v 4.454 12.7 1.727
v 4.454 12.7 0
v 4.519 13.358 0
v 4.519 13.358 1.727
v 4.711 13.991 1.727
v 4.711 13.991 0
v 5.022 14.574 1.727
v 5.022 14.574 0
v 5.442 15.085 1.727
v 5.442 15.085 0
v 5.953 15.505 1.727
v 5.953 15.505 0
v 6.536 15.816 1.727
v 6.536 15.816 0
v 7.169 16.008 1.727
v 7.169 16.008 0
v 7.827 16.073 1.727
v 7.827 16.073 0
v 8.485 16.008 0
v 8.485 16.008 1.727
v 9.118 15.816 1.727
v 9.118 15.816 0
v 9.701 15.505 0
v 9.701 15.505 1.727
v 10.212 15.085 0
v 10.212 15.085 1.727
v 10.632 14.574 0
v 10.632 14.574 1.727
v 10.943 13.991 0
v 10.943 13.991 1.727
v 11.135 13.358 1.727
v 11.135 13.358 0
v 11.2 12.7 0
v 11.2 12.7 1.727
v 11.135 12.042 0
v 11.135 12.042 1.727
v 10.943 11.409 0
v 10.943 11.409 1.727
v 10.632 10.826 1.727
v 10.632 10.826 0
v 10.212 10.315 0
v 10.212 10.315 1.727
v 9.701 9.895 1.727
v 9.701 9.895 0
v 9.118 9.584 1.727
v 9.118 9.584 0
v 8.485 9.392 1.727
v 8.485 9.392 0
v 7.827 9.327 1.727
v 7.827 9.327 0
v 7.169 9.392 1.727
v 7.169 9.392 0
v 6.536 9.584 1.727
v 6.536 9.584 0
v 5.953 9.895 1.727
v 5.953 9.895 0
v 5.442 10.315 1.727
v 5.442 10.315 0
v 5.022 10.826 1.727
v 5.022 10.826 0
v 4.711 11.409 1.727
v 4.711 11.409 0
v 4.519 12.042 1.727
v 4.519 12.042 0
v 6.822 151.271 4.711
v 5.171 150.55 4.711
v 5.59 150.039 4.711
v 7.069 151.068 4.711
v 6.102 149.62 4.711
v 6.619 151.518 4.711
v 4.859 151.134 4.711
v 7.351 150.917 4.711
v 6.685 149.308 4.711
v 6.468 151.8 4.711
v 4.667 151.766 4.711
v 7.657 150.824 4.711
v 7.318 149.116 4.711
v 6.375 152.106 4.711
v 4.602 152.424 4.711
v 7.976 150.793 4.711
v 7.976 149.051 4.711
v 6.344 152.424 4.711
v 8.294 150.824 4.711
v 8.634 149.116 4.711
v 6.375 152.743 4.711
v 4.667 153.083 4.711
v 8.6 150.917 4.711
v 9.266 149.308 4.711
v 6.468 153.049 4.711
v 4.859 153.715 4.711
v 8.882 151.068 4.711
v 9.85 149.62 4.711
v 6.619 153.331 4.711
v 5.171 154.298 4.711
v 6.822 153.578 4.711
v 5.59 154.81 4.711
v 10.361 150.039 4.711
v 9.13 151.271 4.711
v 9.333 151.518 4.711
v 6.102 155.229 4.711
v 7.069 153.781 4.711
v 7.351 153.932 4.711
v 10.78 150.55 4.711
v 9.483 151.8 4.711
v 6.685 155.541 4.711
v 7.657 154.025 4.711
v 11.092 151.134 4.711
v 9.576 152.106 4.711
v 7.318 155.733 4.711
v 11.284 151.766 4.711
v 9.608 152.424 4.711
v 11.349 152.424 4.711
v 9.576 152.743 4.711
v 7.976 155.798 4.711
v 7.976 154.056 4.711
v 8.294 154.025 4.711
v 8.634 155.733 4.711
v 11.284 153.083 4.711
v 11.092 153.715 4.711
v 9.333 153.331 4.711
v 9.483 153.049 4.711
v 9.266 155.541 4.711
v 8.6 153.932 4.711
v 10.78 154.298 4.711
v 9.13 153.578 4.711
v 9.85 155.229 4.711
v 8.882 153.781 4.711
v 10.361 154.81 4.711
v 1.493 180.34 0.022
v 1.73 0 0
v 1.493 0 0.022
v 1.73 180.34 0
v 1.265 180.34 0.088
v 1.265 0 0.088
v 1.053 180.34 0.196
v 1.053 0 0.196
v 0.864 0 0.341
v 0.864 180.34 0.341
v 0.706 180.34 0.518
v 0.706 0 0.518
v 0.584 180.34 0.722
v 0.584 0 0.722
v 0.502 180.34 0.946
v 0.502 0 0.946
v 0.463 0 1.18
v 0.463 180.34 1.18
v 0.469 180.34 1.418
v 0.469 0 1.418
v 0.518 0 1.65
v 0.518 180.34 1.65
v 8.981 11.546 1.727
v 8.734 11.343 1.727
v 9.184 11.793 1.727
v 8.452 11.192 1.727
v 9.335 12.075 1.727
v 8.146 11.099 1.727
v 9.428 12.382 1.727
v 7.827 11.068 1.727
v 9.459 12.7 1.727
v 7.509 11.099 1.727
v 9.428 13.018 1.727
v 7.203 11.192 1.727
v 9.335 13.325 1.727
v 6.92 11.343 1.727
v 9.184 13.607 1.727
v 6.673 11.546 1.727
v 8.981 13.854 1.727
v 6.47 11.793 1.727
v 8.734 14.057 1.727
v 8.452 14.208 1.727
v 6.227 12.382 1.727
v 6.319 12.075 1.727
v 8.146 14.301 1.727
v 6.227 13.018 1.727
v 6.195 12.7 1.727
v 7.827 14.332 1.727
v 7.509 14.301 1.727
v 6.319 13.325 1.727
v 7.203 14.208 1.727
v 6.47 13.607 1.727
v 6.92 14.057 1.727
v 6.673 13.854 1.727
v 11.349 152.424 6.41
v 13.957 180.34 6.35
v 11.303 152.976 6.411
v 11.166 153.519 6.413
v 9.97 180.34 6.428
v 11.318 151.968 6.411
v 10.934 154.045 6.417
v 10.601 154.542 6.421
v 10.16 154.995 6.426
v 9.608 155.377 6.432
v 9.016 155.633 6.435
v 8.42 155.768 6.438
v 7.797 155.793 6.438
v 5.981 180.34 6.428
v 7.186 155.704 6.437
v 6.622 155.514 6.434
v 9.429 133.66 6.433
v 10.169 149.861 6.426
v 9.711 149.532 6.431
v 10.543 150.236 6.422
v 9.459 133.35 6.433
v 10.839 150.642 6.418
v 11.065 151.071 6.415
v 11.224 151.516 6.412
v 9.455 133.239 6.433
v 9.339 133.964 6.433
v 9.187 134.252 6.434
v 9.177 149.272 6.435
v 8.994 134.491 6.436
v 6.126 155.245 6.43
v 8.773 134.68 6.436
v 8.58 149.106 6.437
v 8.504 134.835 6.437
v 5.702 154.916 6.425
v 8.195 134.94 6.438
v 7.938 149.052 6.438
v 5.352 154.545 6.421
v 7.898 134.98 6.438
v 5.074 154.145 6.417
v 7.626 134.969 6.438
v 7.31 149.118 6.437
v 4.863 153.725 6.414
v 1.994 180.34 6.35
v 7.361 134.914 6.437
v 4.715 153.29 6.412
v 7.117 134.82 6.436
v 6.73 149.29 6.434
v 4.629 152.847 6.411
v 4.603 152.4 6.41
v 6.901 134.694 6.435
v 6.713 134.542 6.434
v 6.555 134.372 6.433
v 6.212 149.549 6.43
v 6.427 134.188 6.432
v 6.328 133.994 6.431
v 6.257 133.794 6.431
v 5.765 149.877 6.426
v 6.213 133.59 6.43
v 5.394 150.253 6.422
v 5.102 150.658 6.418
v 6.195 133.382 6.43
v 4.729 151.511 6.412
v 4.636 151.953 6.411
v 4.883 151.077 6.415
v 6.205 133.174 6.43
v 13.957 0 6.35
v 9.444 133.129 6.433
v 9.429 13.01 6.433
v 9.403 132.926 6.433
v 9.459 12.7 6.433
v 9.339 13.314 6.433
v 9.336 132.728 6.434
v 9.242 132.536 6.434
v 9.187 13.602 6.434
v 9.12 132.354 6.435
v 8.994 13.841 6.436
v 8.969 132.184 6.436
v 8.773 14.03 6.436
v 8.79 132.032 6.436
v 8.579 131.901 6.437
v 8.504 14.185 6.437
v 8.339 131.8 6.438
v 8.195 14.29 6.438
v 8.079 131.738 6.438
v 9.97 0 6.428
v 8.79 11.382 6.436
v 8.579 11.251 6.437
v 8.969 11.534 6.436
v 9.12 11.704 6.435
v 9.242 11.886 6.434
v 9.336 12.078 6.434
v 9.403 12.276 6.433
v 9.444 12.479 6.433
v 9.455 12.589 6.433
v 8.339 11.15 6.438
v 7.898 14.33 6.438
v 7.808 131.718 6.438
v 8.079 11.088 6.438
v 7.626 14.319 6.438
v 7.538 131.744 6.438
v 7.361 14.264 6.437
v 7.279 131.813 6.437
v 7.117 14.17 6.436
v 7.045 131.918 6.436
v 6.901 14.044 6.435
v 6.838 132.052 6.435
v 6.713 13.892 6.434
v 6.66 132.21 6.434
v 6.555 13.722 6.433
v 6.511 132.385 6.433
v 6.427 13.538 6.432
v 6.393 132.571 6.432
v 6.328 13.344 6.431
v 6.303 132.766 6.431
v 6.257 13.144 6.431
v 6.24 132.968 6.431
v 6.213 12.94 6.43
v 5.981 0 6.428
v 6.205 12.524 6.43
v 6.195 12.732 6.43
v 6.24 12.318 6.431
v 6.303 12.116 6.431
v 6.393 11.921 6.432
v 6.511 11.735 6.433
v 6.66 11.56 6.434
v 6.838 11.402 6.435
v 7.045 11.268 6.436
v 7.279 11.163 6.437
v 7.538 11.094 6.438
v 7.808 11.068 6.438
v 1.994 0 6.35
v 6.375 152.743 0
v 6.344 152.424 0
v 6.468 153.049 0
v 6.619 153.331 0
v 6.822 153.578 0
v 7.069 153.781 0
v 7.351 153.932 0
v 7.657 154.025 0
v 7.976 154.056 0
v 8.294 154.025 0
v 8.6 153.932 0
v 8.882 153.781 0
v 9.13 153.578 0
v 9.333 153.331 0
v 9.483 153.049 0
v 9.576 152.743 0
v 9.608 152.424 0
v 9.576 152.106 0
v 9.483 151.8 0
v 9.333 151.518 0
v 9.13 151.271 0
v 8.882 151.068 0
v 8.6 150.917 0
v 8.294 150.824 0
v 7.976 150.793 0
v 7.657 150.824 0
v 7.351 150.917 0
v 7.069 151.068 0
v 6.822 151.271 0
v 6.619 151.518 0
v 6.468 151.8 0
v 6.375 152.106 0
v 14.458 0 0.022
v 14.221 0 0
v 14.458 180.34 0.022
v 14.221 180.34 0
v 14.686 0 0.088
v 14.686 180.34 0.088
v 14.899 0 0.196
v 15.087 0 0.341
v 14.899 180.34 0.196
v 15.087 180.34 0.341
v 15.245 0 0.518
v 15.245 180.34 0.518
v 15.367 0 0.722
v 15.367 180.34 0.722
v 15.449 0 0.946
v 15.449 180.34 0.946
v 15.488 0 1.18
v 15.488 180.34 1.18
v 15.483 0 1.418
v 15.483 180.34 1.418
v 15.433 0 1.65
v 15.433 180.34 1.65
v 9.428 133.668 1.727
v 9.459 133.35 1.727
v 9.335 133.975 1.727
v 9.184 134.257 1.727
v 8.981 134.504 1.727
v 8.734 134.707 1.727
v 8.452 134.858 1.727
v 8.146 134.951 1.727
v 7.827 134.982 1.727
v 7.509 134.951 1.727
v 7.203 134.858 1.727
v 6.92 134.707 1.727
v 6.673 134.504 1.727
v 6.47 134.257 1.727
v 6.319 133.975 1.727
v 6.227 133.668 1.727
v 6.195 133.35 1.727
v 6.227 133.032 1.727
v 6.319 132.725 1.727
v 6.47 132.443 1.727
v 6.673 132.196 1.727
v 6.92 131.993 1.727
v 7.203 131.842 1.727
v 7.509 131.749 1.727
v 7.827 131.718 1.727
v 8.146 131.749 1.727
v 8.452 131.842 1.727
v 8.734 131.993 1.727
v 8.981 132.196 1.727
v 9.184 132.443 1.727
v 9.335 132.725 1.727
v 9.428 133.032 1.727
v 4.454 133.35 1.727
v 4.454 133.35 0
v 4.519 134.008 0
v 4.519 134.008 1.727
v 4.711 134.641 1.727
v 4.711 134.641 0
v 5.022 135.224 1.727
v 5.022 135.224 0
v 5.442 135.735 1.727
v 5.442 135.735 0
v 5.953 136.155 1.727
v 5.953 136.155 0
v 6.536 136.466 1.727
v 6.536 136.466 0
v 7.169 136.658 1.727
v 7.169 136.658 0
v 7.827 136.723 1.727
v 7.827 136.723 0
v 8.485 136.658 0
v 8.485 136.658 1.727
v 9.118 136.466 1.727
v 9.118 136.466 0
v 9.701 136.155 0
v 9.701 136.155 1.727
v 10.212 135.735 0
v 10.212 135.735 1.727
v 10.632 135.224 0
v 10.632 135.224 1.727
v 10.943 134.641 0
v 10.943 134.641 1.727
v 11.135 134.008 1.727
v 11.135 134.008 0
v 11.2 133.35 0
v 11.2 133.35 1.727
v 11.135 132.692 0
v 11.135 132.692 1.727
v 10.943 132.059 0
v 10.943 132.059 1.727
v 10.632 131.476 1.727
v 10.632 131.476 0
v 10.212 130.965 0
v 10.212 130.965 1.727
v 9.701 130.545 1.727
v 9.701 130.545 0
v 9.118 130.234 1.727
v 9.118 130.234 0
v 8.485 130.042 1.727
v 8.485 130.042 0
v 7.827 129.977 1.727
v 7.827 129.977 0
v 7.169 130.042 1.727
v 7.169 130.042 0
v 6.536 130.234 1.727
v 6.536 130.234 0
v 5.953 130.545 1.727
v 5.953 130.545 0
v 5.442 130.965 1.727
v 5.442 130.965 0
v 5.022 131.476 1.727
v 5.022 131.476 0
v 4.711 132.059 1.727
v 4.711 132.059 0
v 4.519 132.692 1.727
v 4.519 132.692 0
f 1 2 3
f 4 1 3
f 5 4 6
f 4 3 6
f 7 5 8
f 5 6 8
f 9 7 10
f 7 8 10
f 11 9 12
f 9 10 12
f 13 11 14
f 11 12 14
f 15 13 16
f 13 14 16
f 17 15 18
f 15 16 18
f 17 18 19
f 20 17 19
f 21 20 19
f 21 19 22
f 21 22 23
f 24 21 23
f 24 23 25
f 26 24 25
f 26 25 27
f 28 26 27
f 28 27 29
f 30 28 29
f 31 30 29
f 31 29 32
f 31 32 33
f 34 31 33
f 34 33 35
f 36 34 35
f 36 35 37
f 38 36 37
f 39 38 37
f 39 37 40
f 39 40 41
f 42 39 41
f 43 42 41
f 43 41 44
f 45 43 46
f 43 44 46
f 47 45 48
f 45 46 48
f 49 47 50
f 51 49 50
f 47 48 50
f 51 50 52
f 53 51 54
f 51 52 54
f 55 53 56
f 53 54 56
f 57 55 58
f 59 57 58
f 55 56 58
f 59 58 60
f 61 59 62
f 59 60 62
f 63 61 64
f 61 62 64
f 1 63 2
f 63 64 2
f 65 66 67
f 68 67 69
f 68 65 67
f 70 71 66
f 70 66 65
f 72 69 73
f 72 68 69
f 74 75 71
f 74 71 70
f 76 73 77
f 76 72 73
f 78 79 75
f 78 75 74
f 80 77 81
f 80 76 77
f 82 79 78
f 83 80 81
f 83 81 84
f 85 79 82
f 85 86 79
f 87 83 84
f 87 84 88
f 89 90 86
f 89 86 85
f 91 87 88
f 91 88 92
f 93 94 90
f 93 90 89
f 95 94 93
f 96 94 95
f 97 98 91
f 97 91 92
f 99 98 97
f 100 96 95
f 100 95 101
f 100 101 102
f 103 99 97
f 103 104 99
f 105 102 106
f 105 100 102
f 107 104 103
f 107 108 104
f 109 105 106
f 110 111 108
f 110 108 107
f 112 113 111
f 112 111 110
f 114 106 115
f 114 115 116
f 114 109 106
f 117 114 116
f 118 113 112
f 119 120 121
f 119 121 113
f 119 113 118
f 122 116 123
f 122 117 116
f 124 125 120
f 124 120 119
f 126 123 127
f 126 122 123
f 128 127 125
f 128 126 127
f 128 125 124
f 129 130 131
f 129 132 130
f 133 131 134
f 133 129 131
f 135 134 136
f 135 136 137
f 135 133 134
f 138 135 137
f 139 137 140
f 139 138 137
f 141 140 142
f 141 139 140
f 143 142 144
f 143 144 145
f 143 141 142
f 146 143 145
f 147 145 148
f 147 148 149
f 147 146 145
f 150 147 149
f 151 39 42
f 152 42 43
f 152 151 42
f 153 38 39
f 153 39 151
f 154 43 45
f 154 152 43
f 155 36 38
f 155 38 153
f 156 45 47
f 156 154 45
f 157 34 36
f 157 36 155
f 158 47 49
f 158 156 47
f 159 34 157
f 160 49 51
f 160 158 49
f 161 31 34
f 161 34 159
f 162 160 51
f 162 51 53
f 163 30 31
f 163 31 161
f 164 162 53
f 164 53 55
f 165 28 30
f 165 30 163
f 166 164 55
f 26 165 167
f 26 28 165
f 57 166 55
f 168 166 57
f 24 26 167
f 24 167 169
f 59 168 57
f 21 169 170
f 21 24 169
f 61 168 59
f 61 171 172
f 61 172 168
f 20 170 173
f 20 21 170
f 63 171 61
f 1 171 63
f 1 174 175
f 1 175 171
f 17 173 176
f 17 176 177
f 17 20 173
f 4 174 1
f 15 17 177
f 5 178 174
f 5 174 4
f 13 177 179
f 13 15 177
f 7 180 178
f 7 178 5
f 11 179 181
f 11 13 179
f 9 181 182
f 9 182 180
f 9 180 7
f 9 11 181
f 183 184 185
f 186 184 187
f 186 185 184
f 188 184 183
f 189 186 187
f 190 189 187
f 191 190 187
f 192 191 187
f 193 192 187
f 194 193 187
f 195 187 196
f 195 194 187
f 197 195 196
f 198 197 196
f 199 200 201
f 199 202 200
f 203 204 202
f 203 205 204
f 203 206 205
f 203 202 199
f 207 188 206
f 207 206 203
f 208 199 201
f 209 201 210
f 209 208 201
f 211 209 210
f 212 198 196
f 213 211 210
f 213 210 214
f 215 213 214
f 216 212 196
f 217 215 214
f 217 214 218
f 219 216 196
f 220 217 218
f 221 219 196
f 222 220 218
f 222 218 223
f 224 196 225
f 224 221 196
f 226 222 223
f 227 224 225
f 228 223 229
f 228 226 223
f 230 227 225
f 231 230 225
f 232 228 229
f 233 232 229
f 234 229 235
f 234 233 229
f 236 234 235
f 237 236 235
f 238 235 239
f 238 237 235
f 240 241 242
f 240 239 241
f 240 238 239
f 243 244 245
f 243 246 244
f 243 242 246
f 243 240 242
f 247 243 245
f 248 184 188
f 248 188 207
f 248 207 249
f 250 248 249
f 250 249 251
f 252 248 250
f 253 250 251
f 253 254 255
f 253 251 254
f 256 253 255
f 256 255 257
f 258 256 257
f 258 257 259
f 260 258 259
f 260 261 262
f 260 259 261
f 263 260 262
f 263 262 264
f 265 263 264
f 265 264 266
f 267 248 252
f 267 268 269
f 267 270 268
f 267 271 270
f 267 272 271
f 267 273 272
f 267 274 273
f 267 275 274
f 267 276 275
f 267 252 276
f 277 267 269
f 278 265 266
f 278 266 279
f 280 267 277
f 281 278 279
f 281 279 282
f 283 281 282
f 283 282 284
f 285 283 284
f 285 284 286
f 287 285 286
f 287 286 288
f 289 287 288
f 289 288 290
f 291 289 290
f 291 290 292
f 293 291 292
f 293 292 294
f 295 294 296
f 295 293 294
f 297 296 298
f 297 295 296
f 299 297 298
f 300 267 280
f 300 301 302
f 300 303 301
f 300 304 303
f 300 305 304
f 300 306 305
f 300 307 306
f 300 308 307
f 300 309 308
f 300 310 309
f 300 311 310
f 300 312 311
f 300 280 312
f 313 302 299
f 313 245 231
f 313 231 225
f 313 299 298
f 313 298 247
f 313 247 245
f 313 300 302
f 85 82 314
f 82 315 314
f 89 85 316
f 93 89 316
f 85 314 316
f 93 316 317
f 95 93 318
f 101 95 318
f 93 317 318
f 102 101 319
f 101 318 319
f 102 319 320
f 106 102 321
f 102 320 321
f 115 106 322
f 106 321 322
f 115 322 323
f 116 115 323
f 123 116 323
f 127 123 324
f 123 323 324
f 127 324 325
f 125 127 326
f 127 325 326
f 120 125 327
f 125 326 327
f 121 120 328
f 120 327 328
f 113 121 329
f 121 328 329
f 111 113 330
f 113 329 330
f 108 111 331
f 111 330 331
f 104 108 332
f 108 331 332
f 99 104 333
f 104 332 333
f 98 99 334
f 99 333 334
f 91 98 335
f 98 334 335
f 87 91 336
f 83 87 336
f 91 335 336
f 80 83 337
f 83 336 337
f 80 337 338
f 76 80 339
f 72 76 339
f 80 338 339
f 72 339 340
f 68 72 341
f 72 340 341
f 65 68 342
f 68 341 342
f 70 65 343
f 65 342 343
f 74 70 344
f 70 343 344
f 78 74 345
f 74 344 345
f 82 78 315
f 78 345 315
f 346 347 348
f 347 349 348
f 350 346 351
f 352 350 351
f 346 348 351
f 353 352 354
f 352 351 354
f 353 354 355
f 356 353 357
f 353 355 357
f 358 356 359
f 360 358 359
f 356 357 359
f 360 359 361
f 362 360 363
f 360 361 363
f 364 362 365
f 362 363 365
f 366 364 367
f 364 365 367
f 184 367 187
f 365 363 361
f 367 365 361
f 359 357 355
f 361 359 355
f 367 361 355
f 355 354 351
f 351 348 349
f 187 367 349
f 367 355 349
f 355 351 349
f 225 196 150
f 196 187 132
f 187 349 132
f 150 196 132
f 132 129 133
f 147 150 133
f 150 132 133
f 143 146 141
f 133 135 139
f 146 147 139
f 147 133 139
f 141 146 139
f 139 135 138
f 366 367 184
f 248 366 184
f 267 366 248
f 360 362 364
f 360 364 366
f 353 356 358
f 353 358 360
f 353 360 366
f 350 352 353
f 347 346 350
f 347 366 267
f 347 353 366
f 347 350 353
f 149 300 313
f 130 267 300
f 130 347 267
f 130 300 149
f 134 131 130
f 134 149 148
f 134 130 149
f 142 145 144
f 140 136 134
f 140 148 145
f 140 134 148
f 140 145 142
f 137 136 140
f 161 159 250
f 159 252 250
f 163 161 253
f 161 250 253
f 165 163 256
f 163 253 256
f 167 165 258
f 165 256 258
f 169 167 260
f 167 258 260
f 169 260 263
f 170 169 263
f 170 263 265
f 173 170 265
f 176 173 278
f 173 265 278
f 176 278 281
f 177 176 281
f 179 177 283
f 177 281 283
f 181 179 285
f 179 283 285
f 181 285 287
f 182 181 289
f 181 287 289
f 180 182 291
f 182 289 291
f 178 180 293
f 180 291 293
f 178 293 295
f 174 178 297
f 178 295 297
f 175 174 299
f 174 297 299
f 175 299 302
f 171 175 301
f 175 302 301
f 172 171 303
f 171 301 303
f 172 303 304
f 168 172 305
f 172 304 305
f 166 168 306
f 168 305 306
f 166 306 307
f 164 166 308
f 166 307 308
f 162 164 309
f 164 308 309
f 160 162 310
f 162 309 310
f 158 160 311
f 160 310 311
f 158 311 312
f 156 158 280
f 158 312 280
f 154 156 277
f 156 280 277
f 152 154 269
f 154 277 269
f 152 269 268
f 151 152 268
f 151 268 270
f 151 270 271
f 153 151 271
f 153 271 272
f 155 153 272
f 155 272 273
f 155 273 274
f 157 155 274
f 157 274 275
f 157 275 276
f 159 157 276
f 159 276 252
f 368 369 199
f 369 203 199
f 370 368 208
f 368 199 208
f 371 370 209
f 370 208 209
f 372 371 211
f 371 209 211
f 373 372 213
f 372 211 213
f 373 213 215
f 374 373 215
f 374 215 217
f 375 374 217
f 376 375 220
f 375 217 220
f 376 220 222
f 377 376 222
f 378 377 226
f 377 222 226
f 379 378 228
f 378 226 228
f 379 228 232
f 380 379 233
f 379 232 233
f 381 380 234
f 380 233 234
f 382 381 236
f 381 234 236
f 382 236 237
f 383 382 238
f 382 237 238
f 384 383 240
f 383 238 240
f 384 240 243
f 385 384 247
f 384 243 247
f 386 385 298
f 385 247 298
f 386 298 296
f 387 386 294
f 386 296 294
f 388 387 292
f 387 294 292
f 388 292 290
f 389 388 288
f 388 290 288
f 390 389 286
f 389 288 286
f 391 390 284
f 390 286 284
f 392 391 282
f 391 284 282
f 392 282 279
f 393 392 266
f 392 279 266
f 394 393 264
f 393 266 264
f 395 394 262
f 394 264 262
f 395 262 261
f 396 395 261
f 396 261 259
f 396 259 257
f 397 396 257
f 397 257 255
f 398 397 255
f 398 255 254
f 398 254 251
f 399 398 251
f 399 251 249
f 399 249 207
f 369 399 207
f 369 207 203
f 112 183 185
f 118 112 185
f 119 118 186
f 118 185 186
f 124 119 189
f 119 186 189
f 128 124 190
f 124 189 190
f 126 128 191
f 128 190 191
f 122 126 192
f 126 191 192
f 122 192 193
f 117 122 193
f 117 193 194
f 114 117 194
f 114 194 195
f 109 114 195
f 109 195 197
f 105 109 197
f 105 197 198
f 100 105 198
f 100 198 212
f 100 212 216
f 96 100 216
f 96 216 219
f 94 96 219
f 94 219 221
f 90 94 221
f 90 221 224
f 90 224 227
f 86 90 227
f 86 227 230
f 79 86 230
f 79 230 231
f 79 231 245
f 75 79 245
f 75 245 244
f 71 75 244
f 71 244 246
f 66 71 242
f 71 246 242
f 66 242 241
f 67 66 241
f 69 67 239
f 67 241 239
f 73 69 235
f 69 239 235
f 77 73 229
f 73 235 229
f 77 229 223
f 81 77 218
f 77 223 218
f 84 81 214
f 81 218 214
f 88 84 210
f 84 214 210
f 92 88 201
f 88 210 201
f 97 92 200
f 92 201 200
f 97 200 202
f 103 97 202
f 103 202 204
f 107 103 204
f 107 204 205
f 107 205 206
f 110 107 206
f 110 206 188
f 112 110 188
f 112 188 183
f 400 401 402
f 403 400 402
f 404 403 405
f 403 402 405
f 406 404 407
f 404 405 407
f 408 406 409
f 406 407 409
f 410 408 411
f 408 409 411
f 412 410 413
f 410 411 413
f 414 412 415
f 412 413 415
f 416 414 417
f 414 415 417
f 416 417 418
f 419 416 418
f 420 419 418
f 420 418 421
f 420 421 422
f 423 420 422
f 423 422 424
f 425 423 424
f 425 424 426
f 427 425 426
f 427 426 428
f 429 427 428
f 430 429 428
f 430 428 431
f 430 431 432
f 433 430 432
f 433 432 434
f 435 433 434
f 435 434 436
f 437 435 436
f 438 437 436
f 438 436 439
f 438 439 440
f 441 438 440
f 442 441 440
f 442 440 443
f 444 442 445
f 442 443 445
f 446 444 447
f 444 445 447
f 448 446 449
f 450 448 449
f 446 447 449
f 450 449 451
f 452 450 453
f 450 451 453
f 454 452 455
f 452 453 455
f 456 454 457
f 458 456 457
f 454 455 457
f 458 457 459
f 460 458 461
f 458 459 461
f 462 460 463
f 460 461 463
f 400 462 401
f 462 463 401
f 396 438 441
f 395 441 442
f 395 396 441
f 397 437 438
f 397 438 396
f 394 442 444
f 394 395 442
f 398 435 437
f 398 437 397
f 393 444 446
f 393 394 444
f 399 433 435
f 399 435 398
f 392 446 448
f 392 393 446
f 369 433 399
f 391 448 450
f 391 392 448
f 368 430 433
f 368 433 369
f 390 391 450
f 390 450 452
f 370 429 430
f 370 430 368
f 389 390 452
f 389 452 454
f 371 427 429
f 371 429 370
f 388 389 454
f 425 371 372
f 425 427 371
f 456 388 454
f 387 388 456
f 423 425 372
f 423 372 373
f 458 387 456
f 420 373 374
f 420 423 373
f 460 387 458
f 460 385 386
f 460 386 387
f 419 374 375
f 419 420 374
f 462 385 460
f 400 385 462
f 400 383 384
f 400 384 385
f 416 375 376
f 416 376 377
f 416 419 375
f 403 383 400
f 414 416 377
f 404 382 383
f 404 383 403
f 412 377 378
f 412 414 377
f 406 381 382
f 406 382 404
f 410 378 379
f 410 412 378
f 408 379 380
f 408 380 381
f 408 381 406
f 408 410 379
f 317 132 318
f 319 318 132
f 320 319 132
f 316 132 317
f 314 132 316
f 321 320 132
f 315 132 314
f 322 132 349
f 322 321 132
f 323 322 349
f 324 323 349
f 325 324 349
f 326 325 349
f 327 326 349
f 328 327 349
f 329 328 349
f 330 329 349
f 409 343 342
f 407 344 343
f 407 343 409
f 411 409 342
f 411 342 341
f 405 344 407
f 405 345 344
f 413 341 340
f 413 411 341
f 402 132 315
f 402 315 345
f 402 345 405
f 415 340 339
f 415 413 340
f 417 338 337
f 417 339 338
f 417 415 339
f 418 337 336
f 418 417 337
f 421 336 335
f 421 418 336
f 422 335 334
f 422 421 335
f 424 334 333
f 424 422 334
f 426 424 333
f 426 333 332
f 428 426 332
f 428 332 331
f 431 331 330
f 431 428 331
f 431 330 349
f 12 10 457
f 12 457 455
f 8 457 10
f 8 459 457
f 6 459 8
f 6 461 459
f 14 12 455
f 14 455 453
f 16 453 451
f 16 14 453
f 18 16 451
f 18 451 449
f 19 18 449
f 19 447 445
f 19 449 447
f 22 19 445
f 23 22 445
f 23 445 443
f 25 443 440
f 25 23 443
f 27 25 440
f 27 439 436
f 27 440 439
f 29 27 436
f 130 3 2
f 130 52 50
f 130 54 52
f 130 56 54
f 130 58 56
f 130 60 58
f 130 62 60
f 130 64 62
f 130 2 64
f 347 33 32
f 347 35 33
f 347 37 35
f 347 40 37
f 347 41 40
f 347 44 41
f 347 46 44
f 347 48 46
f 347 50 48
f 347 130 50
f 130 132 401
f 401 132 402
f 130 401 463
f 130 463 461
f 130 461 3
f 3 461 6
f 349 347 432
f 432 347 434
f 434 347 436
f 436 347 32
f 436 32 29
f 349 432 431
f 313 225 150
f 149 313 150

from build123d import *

# Parameters (mm, degrees)
BOSS_EXTRUDE4_DEPTH                                 = 180.34
CBORE_FOR_4_BINDING_HEAD_MACHINE_SCREW1_D           = 3.2639
CBORE_FOR_4_BINDING_HEAD_MACHINE_SCREW1_CBORE_D     = 6.74624
CBORE_FOR_4_BINDING_HEAD_MACHINE_SCREW1_CBORE_DEPTH = 1.7272
FILLET1_R                                           = 1.27
CBORE_FOR_4_BINDING_HEAD_MACHINE_SCREW2_D           = 3.2639
CBORE_FOR_4_BINDING_HEAD_MACHINE_SCREW2_CBORE_D     = 6.74624
CBORE_FOR_4_BINDING_HEAD_MACHINE_SCREW2_CBORE_DEPTH = 1.7272


with BuildPart() as part:
    # Sketch5 → Boss-Extrude4 (new body)
    with BuildSketch(Plane(origin=(0, 0, 0), x_dir=(1, 0, 0), z_dir=(0, 1, 0))):
        with BuildLine():
            Line((0, 0), (15.9512, 0))
            Line((15.9512, 0), (13.9573, -6.35))
            ThreePointArc((13.9573, -6.35), (7.9756, -6.438062229), (1.9939, -6.35))
            Line((1.9939, -6.35), (0, 0))
        make_face()
    extrude(amount=BOSS_EXTRUDE4_DEPTH)

    # CBORE for #4 Binding Head Machine Screw1 (through all)
    with Locations(Plane(origin=(0, 0, 0), x_dir=(-1, 0, 0), z_dir=(0, 0, -1))):
        with Locations((-7.827128231, 133.35), (-7.827128231, 12.7)):
            CounterBoreHole(CBORE_FOR_4_BINDING_HEAD_MACHINE_SCREW1_D / 2, CBORE_FOR_4_BINDING_HEAD_MACHINE_SCREW1_CBORE_D / 2, CBORE_FOR_4_BINDING_HEAD_MACHINE_SCREW1_CBORE_DEPTH)

    # Fillet1
    fillet1_edges = [part.edges().sort_by_distance(p)[0] for p in [
        (0, 90.17, 0),
        (15.9512, 90.17, 0),
    ]]
    fillet(fillet1_edges, radius=FILLET1_R)

    # CBORE for #4 Binding Head Machine Screw2 (through all)
    with Locations(Plane(origin=(7.9756, 152.424464219, 6.438062229), x_dir=(1, 0, 0), z_dir=(0, 0, 1))):
        with Locations((0, 0)):
            CounterBoreHole(CBORE_FOR_4_BINDING_HEAD_MACHINE_SCREW2_D / 2, CBORE_FOR_4_BINDING_HEAD_MACHINE_SCREW2_CBORE_D / 2, CBORE_FOR_4_BINDING_HEAD_MACHINE_SCREW2_CBORE_DEPTH)


solid = part.part
